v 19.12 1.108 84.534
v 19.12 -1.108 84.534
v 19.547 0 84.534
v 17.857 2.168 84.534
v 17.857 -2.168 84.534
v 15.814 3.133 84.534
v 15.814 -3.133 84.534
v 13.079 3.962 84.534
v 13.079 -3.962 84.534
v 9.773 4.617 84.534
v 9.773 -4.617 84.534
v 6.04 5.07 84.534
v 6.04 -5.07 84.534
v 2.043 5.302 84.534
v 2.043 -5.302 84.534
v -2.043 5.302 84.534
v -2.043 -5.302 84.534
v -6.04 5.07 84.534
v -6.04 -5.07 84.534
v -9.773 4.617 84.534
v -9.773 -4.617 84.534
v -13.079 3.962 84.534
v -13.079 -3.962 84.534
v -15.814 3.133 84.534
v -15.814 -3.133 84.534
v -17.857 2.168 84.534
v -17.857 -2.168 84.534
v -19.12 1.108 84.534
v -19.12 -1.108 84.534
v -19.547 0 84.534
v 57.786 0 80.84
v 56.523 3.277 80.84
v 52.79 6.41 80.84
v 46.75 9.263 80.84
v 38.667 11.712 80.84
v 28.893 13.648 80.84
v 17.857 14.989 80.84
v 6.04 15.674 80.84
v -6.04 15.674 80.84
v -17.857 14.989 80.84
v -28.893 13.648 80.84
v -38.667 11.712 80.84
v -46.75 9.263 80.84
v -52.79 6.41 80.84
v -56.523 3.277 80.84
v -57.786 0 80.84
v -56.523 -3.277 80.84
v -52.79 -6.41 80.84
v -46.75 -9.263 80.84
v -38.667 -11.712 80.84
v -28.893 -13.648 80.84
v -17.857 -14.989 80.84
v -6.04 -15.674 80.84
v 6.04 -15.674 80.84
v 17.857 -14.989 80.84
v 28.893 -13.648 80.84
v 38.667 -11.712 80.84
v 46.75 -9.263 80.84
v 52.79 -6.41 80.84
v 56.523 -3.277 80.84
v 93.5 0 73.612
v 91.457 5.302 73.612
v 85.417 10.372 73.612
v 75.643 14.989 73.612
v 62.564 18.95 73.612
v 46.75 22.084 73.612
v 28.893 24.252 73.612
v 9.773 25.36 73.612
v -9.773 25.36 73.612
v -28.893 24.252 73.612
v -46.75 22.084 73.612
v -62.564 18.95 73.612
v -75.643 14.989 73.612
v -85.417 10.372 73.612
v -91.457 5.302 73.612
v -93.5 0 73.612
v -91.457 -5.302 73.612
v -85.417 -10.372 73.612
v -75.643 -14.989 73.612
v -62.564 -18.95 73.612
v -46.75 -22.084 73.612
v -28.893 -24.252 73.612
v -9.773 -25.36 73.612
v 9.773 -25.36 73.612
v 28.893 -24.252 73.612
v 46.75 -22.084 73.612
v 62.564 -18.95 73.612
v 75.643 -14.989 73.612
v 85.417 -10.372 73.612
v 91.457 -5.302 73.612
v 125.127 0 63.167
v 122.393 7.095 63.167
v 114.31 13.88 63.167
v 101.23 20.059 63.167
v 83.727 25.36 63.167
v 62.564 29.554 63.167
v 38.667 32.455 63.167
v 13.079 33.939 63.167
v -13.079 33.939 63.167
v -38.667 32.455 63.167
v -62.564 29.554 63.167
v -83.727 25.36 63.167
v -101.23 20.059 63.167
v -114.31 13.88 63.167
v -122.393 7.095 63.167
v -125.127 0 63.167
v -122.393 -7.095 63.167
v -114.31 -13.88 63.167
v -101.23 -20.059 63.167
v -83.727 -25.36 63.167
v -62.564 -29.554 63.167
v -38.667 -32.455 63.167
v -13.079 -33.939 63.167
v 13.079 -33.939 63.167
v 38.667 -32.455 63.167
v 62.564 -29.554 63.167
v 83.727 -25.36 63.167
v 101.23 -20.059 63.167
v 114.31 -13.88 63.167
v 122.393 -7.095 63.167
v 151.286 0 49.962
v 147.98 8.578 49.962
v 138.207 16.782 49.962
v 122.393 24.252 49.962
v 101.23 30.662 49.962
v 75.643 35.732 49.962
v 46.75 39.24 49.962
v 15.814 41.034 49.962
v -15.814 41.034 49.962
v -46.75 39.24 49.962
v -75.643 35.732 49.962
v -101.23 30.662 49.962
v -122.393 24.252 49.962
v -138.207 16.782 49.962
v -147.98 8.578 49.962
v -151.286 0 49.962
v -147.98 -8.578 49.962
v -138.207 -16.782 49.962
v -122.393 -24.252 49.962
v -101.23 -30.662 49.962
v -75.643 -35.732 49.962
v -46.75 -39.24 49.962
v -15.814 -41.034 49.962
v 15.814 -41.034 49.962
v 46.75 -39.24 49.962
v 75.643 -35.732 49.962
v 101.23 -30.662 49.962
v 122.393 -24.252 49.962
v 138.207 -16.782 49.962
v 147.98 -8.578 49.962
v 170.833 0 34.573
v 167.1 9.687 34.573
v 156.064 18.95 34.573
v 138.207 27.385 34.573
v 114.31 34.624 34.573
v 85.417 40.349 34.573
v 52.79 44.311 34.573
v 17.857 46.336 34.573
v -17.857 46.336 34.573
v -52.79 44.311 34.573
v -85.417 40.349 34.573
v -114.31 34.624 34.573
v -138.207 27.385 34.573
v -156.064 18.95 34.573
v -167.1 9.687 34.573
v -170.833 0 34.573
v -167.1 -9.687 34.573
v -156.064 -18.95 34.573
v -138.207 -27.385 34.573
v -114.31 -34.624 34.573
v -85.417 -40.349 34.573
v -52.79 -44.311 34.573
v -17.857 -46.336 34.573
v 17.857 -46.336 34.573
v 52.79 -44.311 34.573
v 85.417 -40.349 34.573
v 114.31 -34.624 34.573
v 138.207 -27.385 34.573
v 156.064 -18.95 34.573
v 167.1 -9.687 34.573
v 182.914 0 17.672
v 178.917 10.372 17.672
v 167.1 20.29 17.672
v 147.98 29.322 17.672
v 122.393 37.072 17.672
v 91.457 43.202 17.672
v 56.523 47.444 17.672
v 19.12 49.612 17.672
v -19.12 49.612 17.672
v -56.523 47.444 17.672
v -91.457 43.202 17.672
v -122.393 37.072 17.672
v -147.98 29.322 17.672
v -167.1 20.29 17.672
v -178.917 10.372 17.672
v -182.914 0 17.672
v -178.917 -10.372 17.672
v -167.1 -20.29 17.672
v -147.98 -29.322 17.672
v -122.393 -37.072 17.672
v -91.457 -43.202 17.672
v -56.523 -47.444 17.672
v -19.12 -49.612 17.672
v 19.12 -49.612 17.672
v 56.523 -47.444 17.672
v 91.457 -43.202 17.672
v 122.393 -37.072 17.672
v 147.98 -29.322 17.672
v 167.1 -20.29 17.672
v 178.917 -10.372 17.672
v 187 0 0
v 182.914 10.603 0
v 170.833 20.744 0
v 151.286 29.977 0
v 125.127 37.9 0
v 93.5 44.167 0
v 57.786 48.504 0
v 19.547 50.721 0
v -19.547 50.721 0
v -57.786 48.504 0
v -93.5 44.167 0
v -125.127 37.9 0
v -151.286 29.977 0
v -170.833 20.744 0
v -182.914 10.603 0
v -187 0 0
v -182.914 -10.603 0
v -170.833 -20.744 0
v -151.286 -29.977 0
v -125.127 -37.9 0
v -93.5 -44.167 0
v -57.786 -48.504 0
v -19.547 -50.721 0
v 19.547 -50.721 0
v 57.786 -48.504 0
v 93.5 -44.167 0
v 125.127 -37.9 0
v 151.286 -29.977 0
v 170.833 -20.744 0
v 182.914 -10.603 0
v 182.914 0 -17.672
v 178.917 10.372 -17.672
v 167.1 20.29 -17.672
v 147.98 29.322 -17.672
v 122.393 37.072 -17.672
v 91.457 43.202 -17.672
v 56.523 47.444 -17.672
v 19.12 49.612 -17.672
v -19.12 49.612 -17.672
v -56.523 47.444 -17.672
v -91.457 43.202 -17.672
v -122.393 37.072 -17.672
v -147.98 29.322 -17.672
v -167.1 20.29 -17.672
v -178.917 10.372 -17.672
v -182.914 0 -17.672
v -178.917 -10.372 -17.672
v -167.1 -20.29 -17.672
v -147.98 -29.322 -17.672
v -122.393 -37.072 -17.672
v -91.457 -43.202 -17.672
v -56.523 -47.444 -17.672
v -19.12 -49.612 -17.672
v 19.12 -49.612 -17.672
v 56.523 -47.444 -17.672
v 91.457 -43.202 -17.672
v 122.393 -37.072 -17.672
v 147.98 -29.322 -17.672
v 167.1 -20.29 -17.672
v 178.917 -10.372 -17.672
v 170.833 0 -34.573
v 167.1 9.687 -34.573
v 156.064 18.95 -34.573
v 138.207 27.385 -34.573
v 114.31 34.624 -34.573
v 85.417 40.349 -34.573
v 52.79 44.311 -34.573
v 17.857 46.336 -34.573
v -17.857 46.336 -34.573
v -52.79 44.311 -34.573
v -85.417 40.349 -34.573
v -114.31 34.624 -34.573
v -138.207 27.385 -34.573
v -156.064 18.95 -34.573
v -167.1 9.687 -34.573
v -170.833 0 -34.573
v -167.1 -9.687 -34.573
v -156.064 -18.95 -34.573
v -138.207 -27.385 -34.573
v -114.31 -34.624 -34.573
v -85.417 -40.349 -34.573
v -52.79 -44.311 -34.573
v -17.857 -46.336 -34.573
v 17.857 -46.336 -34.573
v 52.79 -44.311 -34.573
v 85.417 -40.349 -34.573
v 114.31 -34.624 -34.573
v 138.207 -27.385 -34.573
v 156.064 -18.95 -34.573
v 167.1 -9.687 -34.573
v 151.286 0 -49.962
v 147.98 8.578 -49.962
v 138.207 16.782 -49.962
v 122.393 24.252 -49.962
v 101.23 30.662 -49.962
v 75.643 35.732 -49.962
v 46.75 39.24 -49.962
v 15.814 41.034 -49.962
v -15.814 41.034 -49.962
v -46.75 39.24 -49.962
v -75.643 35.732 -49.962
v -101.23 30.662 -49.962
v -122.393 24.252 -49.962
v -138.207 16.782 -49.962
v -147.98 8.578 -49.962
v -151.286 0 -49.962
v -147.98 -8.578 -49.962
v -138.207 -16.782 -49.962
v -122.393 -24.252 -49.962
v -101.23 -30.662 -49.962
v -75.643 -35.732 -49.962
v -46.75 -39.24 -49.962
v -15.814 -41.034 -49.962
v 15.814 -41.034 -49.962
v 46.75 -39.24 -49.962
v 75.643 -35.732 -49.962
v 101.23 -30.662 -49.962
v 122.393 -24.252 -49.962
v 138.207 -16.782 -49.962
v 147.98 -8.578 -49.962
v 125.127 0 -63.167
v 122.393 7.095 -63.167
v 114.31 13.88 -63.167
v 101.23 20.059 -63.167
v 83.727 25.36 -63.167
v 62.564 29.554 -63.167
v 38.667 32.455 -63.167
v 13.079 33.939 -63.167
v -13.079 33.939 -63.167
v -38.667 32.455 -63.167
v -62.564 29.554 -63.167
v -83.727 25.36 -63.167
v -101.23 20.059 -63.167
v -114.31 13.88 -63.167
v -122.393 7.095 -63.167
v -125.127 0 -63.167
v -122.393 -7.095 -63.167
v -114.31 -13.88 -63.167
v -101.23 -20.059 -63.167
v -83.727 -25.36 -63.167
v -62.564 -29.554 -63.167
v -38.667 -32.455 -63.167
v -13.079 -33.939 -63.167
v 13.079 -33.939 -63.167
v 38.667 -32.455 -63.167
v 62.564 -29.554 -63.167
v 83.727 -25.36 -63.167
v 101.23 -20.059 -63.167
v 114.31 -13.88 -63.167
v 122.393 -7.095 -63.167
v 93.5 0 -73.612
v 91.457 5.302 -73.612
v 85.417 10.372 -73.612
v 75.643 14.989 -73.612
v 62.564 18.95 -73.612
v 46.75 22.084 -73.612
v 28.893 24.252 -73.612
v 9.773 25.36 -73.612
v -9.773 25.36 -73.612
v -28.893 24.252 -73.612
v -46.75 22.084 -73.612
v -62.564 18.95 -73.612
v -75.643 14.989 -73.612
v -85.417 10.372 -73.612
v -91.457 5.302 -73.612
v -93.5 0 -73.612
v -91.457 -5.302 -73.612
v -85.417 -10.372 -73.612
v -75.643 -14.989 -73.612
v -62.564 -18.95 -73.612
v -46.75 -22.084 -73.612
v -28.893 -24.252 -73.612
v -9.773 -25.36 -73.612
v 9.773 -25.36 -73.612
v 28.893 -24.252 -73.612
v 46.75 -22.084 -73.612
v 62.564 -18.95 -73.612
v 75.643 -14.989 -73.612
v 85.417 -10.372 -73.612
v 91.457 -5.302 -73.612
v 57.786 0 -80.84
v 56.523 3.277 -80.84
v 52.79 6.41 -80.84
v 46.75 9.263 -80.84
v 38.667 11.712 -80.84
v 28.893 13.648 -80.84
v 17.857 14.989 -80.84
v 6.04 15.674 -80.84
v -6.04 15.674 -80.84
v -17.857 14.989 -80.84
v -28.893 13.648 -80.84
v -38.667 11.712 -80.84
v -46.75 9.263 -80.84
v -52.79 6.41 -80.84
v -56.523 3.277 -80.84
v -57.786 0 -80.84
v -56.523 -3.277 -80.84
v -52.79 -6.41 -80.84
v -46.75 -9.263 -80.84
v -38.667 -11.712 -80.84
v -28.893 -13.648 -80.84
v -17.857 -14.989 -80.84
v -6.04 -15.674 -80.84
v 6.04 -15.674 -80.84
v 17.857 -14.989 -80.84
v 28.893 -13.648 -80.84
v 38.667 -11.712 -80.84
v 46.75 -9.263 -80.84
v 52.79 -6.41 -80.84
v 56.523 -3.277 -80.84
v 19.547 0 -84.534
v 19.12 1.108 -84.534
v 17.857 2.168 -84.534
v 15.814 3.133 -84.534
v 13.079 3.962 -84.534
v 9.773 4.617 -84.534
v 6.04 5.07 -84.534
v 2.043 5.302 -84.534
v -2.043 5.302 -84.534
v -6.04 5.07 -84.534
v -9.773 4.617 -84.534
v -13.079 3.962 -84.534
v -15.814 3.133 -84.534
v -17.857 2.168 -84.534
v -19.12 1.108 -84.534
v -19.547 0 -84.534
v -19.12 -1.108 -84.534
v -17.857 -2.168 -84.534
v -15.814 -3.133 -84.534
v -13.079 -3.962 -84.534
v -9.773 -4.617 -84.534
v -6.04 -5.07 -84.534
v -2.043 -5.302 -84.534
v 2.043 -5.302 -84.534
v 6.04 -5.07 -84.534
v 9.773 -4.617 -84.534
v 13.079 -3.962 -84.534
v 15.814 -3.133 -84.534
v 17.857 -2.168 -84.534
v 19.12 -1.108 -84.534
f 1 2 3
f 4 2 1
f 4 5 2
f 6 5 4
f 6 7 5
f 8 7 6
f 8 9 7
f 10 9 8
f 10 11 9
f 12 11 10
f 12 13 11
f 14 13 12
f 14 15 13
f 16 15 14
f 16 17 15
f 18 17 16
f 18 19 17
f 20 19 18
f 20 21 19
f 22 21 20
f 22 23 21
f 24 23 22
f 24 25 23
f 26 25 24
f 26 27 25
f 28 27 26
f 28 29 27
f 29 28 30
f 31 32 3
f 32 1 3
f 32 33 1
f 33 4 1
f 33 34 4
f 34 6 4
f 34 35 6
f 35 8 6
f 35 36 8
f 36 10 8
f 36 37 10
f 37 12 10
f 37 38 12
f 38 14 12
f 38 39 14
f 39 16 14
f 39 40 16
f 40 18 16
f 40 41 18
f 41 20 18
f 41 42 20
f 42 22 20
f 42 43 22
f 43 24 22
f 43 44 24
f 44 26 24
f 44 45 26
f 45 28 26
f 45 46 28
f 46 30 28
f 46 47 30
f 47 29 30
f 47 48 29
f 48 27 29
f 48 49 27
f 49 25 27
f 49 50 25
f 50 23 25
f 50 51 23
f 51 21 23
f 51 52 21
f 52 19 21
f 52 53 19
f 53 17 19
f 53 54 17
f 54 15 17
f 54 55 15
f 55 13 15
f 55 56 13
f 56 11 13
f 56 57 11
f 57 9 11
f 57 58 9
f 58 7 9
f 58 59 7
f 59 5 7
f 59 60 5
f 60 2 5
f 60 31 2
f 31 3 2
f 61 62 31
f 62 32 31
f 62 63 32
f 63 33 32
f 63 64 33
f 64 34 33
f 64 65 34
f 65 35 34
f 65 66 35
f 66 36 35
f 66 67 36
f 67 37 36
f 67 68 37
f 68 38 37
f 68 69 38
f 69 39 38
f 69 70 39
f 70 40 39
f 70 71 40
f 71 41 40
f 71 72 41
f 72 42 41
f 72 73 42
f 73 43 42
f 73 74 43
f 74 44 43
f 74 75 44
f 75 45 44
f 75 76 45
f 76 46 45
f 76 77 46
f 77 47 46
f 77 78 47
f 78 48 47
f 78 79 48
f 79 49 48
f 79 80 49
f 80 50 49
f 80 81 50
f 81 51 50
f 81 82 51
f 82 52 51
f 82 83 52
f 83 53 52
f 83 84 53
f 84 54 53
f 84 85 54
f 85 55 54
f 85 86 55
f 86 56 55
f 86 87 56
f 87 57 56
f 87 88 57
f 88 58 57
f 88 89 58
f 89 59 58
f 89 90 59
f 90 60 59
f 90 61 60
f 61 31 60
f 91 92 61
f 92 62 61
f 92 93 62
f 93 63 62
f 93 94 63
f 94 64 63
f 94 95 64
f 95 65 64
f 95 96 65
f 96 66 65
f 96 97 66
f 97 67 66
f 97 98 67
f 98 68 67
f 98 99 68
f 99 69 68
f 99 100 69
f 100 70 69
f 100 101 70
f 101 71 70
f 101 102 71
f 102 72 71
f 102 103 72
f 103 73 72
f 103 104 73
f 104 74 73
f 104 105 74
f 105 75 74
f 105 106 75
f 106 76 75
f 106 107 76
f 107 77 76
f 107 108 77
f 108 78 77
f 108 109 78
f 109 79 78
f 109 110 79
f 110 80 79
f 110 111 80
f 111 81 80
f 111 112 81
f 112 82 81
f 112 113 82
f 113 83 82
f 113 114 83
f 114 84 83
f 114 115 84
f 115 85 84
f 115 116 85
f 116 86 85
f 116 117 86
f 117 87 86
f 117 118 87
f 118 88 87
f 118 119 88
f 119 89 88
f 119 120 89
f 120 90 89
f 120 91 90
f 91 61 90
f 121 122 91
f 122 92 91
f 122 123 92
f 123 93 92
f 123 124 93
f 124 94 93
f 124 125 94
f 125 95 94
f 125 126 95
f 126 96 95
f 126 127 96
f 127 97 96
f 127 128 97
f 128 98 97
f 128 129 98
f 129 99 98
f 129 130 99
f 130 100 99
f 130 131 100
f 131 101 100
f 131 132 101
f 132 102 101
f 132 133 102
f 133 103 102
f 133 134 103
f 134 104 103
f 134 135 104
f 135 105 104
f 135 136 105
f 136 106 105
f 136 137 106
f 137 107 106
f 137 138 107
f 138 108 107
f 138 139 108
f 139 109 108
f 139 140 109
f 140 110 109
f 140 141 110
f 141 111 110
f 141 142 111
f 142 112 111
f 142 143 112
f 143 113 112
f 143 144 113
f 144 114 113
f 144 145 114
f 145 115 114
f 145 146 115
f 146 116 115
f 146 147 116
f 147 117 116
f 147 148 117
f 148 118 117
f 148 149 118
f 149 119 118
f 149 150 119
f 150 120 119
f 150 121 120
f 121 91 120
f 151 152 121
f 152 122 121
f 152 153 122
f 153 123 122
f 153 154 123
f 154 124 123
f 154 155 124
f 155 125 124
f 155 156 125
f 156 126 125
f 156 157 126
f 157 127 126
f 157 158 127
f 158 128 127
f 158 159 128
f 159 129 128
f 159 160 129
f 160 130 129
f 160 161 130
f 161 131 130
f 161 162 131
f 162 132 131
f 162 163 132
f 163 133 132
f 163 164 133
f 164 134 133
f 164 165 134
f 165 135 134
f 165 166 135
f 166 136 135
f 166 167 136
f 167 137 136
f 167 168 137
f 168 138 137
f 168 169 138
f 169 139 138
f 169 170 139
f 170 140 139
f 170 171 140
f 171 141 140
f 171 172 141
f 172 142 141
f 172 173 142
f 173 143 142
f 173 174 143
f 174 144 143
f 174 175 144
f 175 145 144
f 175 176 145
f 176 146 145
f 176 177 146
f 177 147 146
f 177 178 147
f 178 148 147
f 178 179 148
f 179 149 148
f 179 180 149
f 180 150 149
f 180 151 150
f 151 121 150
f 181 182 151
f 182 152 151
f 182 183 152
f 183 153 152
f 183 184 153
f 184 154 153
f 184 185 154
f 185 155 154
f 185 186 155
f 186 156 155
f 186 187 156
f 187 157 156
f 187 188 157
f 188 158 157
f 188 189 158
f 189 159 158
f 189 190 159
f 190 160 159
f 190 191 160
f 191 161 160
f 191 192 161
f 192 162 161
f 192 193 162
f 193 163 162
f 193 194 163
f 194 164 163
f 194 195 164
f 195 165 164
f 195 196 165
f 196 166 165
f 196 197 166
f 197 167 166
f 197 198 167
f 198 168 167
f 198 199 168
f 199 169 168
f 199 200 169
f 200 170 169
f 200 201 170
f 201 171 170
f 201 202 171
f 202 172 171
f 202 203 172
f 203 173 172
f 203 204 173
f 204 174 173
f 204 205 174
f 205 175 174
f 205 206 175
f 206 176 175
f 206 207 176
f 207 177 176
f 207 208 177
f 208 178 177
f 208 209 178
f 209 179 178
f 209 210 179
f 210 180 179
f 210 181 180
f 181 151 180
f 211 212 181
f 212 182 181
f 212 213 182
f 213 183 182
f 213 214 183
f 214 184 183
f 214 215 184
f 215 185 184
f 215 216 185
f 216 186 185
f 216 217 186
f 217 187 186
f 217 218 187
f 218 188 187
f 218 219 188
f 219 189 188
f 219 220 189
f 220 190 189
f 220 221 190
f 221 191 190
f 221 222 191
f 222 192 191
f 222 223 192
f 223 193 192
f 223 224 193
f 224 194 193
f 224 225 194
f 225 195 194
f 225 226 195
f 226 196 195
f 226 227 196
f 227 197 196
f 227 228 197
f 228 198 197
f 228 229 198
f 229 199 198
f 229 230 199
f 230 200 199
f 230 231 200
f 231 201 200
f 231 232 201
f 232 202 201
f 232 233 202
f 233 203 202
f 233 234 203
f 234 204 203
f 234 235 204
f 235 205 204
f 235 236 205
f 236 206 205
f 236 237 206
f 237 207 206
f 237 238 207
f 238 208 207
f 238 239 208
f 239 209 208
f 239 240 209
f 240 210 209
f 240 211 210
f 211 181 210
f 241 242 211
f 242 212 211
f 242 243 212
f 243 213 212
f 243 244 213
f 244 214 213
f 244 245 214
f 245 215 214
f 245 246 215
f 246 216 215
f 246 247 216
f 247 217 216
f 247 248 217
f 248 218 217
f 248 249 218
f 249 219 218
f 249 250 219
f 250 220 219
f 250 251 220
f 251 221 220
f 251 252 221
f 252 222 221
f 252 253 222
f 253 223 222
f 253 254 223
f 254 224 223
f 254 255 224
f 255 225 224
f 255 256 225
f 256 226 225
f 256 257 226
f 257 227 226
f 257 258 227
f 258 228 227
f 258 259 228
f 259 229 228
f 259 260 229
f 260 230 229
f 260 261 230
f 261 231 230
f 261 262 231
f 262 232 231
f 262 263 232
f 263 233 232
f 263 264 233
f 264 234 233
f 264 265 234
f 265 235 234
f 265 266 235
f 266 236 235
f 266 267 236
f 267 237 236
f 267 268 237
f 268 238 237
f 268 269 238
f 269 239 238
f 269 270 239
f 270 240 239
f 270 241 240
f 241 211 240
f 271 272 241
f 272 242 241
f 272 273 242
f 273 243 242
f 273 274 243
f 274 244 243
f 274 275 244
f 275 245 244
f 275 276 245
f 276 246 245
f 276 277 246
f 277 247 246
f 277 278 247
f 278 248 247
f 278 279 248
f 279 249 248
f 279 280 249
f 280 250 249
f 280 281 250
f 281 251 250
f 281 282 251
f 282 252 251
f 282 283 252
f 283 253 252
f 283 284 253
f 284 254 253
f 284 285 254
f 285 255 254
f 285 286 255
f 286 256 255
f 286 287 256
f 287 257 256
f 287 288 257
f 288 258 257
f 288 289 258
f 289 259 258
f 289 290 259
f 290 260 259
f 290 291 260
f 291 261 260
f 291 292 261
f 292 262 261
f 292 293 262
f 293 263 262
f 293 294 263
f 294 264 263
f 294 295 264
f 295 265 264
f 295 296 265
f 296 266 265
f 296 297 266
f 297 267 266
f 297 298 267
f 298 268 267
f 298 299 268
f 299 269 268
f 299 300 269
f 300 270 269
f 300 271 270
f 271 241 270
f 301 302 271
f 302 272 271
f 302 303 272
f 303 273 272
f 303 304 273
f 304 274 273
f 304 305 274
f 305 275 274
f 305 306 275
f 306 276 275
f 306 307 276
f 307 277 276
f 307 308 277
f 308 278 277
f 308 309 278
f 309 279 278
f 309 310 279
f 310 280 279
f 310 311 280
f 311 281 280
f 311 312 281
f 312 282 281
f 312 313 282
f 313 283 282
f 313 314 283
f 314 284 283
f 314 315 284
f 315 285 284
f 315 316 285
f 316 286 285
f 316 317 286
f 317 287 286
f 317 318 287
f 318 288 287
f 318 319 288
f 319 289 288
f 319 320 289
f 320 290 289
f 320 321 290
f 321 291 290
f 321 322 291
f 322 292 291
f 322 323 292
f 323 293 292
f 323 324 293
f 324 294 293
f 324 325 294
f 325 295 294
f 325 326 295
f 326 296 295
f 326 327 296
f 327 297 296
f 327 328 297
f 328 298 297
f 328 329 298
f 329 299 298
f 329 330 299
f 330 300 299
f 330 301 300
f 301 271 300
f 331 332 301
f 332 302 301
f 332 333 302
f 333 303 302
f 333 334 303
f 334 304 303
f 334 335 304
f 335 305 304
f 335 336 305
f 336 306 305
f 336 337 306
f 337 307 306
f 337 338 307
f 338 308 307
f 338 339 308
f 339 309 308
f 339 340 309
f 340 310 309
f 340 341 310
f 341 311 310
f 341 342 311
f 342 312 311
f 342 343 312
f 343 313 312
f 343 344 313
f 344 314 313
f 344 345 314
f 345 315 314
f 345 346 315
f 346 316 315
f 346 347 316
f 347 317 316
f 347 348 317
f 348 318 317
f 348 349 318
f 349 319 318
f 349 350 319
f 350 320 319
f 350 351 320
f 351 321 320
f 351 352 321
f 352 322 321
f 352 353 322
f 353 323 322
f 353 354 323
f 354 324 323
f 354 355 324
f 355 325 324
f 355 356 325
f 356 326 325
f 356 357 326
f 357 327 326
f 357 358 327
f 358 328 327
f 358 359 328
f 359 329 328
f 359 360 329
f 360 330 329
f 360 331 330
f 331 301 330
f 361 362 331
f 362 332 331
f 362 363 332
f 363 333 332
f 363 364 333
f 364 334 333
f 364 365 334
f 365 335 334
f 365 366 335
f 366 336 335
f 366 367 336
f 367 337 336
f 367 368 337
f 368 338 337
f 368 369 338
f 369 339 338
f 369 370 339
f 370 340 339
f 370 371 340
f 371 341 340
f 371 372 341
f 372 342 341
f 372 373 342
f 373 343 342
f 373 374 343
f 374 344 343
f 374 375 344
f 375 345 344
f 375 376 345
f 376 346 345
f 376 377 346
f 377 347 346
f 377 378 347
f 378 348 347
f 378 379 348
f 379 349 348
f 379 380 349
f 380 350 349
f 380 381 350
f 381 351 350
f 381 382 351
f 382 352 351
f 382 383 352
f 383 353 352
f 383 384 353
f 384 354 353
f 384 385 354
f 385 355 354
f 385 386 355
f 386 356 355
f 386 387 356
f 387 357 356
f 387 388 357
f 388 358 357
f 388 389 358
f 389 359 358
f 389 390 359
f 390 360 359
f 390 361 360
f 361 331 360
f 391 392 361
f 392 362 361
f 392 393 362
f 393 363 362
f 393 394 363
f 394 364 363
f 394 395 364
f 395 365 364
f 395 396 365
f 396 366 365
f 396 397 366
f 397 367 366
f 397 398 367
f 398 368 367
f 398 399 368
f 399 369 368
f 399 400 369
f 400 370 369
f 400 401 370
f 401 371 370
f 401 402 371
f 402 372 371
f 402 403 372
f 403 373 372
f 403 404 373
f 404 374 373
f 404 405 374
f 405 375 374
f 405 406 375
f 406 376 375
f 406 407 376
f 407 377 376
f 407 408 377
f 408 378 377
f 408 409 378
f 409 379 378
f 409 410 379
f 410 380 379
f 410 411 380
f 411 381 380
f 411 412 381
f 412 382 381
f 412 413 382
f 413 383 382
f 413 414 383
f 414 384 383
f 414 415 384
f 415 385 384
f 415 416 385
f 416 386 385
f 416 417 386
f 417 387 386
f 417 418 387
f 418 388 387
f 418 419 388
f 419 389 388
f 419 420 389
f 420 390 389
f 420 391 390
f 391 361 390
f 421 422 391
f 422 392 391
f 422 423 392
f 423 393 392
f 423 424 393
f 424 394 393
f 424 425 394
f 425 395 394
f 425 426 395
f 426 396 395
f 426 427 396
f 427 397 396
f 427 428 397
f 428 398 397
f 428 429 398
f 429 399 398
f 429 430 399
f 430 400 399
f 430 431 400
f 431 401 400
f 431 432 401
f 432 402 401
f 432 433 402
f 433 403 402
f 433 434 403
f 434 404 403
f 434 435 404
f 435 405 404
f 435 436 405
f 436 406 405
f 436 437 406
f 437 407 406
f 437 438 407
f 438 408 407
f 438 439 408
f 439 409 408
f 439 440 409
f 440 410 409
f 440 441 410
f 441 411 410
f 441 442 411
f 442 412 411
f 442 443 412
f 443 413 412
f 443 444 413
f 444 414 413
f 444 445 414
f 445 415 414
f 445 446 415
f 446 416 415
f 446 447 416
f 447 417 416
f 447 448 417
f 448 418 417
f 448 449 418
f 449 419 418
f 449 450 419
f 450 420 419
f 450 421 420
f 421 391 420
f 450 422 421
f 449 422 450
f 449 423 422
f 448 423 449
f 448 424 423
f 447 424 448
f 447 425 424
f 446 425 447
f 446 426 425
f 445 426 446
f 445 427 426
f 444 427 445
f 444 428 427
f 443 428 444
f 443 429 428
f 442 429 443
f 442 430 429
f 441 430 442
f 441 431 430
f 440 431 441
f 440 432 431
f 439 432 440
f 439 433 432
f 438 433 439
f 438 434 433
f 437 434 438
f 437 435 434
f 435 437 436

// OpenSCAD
// Generated by SolidPython 1.0.1 on 2020-07-29 00:46:49


scale(v = [11, 3, 5]) {
	sphere(r = 17);
}
/***********************************************
*********      SolidPython code:      **********
************************************************
 
# import packages: SolidPython
from solid import *
from solid.utils import *
from itertools import chain, combinations, permutations


class Resize:

    def __init__(self, scad_file):
        self.scad_file = scad_file
        #self.scad_file = import_scad(scad_file)
        # cone/cylinder param:
        self.r1 = 0
        self.r2 = 0
        self.h = 0
        # rectangular prism param:
        self.w = 0
        self.l = 0
        # ellipse param:
        self.r = 0

    # import OpenScad code (file name corresponds to shape)


    # classify shape + parameters
    def assign(self, param1, param2, param3):
        if self.scad_file == 'cone.scad':
            self.r1 = param1
            self.r2 = param2
            self.h = param3
        elif self.scad_file == 'cylinder.scad':
            self.r1 = param1
            self.r2 = param2
            self.h = param3
        elif self.scad_file == 'rectangularPrism.scad':
            self.h = param1
            self.l = param2
            self.w = param3
        else:
            self.r = param1
            self.h = param2

    # resize parameters
    def iterate(self):
        x = range(3, 20, 2)
        i = 1
        if self.scad_file == 'cone.scad':
            tempList = list(permutations(x, 2))
            for temp in tempList:
                param1 = temp[0]
                param2 = temp[1]
                filepath = 'produced_scad_files/' + 'cone' + str(param1) + '_' + str(param2) + '_' + '.scad'
                scad_render_to_file(cylinder(h=param1, r1=param2, r2=0), filepath)

        elif self.scad_file == 'cylinder.scad':
            tempList = list(permutations(x, 3))
            for temp in tempList:
                param1 = temp[0]
                param2 = temp[1]
                filepath = 'produced_scad_files/' + 'cylinder' + str(param1) + '_' + str(param2) + '_' + '.scad'
                scad_render_to_file(cylinder(h=param1, r1=param2, r2=param2), filepath)

        elif self.scad_file == 'rectangularPrism.scad':
            tempList = list(permutations(x, 3))
            for temp in tempList:
                param1 = temp[0]
                param2 = temp[1]
                param3 = temp[2]
                filepath = 'produced_scad_files/' + 'rectangularPrism' + str(param1) + '_' + str(param2) + '_' + str(
                    param3) + '.scad'
                scad_render_to_file(cube(size=(param1, param2, param3)), filepath)

        elif self.scad_file == 'ellipse.scad':
            tempList = list(permutations(x, 4))
            for temp in tempList:
                param1 = temp[0]
                param2 = temp[1]
                param3 = temp[2]
                param4 = temp[3]
                filepath = 'produced_scad_files/' + 'ellipse' + str(param1) + '_' + str(param2) + '_' + str(param3) + '_' + str(param4) + '.scad'
                scad_render_to_file(scale([param1, param2, param3])(sphere(r=param4)), filepath)

    def render_to_scadfile(self):
        scad_render_to_file(scad, 'example.scad') 
 
************************************************/
